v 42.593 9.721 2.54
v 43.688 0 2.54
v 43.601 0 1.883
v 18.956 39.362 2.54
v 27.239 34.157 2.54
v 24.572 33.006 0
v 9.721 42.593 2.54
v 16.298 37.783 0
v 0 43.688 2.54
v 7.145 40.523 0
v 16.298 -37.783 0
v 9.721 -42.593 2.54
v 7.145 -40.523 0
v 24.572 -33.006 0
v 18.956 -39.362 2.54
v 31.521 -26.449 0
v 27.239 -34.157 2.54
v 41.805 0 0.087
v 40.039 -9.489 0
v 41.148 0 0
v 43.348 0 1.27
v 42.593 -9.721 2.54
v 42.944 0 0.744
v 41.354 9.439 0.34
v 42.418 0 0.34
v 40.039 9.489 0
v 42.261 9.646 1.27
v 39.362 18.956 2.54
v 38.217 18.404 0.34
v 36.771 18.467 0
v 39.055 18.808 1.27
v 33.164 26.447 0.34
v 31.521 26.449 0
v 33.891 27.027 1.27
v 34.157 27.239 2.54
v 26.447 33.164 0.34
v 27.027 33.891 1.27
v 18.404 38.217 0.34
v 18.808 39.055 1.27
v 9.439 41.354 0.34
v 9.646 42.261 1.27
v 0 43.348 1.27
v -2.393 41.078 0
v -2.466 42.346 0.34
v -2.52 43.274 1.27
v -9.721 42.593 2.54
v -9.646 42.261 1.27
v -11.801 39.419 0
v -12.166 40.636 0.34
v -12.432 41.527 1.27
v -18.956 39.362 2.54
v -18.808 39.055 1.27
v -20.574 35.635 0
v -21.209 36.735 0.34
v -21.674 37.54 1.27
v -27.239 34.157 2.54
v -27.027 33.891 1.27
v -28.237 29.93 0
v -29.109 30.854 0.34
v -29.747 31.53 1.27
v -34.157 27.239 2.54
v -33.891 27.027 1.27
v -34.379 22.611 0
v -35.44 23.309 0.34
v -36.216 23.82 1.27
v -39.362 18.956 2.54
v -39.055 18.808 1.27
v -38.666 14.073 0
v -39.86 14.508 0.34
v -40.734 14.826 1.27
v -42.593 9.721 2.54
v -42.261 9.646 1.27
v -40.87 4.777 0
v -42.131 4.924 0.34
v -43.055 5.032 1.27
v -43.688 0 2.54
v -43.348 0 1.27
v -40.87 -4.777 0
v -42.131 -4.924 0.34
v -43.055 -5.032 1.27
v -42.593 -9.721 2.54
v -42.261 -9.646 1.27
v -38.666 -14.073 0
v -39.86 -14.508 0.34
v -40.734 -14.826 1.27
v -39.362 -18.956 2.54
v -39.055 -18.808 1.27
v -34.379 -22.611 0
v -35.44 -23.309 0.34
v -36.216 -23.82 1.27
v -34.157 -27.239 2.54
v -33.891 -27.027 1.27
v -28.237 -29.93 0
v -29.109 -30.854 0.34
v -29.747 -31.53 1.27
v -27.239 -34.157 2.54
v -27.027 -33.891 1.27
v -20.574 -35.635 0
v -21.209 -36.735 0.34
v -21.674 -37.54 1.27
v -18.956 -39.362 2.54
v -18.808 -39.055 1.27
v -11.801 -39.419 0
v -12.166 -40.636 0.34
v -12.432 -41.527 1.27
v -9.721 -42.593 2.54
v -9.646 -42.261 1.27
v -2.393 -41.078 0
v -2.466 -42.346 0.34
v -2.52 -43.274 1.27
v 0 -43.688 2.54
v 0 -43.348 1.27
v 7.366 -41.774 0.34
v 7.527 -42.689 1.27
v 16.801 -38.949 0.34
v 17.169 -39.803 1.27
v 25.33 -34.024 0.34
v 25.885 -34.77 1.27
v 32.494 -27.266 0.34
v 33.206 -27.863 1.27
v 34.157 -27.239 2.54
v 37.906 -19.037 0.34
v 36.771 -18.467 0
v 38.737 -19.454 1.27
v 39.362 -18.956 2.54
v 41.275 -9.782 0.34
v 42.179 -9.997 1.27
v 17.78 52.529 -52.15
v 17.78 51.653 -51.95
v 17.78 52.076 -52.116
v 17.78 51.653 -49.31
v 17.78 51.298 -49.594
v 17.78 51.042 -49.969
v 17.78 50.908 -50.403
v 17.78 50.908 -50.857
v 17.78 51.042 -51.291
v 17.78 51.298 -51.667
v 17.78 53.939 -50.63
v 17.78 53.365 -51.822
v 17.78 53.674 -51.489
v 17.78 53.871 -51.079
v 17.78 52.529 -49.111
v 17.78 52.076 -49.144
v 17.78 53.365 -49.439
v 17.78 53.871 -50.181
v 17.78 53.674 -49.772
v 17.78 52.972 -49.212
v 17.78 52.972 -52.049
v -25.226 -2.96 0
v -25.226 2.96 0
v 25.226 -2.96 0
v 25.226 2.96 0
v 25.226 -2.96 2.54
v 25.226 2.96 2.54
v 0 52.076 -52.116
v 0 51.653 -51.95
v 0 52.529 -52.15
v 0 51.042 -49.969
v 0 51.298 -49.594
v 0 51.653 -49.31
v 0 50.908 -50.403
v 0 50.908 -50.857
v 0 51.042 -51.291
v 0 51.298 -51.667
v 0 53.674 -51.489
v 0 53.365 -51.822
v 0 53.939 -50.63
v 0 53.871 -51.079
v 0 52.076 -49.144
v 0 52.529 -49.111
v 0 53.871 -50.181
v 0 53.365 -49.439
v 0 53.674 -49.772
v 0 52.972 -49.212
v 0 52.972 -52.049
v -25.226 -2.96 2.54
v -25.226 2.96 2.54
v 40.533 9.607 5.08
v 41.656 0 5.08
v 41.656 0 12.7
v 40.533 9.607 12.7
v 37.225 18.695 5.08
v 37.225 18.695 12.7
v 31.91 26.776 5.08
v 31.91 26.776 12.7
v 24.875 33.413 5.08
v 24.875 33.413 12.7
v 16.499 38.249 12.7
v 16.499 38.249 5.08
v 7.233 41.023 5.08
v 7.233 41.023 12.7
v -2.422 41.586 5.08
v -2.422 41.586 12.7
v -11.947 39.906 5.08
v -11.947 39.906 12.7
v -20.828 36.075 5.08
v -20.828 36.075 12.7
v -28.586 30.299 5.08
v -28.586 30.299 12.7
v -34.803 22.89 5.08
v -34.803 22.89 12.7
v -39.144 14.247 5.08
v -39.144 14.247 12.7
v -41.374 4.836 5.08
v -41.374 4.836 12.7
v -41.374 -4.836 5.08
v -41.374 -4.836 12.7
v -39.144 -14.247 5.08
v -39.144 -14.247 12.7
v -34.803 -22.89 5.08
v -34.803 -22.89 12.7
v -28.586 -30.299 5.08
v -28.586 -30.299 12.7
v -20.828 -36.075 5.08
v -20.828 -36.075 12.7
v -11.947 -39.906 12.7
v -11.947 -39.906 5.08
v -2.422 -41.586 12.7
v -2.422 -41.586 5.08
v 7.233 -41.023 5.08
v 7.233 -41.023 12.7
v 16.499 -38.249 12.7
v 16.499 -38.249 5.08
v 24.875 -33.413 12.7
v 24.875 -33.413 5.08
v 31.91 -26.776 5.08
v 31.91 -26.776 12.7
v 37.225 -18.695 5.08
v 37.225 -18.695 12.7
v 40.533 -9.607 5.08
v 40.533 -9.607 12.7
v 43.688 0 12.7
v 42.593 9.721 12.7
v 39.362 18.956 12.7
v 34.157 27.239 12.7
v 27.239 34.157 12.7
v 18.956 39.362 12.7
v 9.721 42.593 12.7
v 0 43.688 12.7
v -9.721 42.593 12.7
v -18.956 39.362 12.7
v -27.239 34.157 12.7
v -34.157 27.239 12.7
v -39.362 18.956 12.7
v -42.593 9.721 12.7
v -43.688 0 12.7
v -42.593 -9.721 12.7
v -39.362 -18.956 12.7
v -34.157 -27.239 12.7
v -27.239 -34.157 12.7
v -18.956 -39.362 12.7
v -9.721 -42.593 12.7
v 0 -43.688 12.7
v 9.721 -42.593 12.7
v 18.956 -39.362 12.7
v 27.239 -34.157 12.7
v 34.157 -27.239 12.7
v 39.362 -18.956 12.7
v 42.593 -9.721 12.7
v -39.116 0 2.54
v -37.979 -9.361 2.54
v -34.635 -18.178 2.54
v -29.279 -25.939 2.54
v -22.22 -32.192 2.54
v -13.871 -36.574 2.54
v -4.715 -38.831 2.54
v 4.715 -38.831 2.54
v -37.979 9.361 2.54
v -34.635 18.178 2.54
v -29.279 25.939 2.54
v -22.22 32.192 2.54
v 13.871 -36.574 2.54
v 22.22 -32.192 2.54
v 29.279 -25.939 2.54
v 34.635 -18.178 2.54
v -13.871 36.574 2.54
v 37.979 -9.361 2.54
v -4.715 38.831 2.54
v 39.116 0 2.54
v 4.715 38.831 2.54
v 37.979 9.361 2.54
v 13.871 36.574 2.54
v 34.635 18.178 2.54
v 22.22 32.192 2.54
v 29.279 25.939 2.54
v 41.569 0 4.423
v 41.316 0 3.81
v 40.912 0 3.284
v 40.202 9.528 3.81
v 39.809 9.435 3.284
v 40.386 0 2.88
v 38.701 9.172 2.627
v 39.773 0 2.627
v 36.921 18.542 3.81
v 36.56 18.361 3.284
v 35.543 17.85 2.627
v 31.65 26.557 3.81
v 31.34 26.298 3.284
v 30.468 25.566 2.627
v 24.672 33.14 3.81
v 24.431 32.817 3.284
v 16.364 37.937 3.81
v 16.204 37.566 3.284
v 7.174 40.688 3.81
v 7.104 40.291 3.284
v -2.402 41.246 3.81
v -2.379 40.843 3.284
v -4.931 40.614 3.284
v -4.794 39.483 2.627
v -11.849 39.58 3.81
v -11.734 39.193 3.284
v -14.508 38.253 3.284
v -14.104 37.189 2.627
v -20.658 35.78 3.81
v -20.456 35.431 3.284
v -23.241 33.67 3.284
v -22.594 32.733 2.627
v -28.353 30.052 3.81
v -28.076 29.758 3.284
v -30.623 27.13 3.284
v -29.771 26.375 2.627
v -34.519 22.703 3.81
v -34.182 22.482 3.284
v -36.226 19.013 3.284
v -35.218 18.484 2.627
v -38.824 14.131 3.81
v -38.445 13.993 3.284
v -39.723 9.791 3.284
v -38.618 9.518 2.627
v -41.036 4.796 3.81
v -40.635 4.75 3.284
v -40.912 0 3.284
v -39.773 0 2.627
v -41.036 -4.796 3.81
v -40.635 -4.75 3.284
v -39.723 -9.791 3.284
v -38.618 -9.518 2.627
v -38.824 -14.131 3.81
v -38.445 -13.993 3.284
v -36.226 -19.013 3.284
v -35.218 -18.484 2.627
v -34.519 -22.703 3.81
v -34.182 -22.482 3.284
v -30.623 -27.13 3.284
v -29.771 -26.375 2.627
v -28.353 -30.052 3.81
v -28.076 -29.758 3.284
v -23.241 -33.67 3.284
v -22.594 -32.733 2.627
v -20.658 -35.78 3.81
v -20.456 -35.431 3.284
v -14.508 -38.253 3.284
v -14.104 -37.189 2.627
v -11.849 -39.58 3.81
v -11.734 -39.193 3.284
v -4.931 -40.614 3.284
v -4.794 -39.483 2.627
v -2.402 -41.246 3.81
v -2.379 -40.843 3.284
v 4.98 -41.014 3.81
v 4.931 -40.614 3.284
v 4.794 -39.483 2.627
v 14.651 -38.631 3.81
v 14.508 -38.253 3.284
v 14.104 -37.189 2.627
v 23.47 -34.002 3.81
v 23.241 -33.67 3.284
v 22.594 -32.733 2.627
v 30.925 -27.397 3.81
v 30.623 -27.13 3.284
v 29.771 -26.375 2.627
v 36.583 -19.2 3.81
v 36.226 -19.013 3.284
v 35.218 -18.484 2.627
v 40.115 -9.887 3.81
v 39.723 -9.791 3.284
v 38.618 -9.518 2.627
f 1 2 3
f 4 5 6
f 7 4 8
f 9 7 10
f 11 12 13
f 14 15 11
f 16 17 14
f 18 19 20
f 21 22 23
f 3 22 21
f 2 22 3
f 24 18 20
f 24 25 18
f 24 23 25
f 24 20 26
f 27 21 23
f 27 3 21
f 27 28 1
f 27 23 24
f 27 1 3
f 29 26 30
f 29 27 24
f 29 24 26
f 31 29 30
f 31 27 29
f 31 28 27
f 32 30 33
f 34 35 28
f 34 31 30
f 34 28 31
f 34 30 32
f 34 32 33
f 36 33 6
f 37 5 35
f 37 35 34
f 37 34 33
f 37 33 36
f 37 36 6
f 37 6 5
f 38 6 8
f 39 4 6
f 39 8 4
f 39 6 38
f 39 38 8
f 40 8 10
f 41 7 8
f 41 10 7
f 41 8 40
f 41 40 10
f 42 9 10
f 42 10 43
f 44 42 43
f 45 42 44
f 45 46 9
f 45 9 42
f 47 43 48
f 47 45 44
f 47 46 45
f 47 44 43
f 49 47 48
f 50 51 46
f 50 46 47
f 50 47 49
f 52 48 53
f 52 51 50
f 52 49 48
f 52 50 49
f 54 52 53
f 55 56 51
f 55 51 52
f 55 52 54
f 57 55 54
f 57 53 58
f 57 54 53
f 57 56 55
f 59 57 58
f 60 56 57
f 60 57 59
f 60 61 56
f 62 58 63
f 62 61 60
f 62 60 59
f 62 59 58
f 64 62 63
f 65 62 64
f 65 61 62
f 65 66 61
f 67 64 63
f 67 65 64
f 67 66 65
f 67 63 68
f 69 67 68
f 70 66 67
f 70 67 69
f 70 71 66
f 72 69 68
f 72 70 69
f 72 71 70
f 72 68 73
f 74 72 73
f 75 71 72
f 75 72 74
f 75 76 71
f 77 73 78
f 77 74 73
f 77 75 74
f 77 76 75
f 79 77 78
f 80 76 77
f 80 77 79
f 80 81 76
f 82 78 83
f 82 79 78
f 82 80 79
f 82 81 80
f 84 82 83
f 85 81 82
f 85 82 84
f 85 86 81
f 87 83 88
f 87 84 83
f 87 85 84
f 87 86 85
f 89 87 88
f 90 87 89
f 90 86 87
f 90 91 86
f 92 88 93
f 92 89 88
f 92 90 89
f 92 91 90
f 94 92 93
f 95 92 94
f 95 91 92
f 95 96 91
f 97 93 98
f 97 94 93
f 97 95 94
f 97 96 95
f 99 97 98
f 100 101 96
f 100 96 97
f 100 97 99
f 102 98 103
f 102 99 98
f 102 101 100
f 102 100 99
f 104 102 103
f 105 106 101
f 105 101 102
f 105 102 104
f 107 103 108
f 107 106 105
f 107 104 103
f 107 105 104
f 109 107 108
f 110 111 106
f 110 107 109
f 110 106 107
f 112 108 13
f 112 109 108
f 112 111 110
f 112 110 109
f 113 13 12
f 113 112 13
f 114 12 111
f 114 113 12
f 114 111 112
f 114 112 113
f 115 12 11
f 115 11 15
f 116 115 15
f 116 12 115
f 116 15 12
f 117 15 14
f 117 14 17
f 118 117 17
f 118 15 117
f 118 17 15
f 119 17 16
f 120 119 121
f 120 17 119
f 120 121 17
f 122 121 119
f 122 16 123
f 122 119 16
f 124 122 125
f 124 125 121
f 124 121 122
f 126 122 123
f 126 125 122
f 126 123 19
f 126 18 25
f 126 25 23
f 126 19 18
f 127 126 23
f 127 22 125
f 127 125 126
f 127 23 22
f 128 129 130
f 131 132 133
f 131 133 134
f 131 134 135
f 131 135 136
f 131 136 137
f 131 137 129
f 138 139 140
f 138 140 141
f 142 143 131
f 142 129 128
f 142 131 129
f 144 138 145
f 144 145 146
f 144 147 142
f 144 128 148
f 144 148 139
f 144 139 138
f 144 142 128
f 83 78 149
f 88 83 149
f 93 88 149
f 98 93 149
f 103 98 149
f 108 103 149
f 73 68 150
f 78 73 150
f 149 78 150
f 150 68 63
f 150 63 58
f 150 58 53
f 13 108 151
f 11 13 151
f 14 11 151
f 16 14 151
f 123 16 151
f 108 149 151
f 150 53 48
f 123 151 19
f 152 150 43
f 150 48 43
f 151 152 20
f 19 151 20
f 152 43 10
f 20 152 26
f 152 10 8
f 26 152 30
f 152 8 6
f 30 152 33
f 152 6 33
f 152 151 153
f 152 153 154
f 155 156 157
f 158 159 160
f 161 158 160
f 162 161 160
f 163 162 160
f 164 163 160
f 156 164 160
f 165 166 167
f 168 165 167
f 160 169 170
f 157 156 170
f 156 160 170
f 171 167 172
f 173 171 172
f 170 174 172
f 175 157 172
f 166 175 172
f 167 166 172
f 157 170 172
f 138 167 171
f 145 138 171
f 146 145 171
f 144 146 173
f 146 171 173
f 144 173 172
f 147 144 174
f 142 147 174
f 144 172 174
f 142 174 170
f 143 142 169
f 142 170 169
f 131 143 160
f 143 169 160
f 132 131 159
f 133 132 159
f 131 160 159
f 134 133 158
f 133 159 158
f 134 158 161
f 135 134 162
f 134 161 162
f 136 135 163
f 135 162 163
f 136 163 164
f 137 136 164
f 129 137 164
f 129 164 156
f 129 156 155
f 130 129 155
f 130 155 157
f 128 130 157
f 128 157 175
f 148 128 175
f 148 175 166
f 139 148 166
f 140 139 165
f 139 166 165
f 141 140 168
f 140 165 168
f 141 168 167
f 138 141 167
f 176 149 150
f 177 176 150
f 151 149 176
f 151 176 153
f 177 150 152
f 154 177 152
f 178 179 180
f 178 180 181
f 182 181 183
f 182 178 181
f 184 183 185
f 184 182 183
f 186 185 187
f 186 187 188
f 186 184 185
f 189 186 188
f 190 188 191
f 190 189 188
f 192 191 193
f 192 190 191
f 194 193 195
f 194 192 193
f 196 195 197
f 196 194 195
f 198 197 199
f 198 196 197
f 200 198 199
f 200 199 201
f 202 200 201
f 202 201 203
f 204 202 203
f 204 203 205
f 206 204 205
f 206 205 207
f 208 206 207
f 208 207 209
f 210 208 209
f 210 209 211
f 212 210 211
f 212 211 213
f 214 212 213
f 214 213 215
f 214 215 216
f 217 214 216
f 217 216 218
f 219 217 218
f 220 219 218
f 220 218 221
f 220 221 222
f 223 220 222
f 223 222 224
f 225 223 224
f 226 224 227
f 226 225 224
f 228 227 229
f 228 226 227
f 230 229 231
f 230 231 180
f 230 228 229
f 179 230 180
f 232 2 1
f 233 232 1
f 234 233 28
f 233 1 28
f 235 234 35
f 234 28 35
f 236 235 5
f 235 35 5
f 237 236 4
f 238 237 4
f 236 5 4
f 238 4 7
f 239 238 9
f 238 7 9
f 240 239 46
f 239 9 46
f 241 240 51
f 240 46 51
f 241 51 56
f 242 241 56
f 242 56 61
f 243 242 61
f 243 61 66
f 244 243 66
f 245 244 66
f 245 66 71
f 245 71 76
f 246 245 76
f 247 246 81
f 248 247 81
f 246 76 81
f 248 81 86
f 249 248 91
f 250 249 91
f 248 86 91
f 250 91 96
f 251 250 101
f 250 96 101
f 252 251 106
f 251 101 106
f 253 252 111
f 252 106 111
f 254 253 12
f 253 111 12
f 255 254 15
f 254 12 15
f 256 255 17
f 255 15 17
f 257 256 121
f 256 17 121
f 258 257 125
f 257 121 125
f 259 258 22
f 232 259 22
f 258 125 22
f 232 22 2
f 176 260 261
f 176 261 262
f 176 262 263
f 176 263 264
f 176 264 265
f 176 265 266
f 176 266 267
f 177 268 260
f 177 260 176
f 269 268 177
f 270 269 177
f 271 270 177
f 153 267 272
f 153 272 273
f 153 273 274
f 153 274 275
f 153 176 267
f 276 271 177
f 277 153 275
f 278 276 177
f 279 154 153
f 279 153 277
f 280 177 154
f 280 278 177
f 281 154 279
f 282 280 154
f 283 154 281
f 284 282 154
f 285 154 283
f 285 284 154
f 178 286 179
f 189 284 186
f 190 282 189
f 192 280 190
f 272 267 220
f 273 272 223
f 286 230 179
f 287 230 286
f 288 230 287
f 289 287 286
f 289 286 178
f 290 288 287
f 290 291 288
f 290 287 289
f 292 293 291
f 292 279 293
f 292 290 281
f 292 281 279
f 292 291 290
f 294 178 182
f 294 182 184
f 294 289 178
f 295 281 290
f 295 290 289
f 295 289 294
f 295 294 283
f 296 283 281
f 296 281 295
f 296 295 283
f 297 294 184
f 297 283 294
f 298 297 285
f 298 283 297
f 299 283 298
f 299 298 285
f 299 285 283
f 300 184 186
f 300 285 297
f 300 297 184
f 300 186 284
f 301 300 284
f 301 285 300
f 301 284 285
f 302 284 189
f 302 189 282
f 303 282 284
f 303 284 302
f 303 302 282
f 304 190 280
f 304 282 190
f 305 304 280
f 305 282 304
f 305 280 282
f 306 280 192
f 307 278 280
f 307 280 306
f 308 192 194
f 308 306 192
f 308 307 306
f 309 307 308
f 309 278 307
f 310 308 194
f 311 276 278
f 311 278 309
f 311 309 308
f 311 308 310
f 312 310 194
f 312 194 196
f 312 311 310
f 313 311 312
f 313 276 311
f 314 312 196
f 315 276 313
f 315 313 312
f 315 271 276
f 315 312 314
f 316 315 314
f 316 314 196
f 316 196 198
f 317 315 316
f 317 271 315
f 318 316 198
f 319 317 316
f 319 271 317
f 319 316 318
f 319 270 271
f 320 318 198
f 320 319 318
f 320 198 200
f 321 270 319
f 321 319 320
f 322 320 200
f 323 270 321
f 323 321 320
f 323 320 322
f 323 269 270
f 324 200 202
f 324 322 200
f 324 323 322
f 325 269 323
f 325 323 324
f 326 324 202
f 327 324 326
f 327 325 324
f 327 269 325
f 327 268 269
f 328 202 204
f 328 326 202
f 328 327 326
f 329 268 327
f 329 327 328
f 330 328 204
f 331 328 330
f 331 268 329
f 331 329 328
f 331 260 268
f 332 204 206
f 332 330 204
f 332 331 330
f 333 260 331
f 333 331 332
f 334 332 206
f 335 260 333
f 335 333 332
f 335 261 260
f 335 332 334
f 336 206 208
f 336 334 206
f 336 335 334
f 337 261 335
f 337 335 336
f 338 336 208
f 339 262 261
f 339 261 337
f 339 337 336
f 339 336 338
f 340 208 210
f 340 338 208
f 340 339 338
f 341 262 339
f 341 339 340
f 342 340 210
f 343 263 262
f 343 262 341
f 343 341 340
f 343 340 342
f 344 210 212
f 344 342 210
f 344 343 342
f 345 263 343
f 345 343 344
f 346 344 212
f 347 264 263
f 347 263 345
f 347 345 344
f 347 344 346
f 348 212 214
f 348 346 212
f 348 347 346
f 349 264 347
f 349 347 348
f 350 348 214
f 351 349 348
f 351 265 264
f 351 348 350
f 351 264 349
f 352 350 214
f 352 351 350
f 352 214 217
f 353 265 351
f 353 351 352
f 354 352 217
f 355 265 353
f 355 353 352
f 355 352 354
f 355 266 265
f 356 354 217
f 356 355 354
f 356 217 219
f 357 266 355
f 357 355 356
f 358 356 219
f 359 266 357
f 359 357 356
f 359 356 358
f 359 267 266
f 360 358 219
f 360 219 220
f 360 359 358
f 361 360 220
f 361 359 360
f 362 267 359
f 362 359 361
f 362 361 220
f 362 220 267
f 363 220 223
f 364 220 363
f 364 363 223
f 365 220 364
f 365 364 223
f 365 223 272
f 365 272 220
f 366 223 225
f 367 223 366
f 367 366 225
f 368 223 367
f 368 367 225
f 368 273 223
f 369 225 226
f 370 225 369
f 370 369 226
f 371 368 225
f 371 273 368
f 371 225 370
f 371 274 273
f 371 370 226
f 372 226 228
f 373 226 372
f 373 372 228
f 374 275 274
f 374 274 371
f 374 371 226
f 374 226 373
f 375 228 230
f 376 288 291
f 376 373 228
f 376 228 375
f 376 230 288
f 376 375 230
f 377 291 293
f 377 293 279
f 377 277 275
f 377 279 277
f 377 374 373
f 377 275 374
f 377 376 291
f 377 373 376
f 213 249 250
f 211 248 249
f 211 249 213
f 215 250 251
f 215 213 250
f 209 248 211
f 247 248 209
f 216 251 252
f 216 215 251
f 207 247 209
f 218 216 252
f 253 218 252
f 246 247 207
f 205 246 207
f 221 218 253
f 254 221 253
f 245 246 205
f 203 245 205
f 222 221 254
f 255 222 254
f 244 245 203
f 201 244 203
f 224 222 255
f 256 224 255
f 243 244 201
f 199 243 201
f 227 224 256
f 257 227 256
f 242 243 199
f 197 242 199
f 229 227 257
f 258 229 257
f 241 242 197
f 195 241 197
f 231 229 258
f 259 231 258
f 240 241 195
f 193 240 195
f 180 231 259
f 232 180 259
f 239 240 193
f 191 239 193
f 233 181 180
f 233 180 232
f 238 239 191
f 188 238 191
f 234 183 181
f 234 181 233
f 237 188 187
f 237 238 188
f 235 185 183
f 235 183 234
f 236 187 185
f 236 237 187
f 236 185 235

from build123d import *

# Parameters (mm, degrees)
F0_R     = 43.688
F0_R_2   = 41.656
F1_DEPTH = 12.7
F2_DEPTH = 2.54
F3_R     = 2.54
F4_R     = 1.524
F5_DEPTH = 17.78
F6_W     = 50.452404
F6_H     = 5.919292
F7_DEPTH = 25.4


with BuildPart() as f1:
    # F0 (on Top) → F1 (new body)
    with BuildSketch(Plane.XY):
        Circle(F0_R)
        Circle(F0_R_2, mode=Mode.SUBTRACT)
    extrude(amount=F1_DEPTH)

    # F0 (on Top) → F2 (join)
    with BuildSketch(Plane.XY):
        Circle(F0_R_2)
    extrude(amount=F2_DEPTH)

    # F3
    f3_edges = [f1.edges().sort_by_distance(p)[0] for p in [
        (-41.656, 0, 2.54),
        (-43.688, 0, 0),
    ]]
    fillet(f3_edges, radius=F3_R)

    # F6 (on face) → F7 (cut)
    with BuildSketch(Plane.XY):
        Rectangle(F6_W, F6_H)
    extrude(amount=F7_DEPTH, mode=Mode.SUBTRACT)


with BuildPart() as f5:
    # F4 (on Right) → F5 (new body)
    with BuildSketch(Plane.YZ):
        with Locations((52.414779, -50.63026)):
            Circle(F4_R)
    extrude(amount=F5_DEPTH)


solid = Compound([f1.part, f5.part])
